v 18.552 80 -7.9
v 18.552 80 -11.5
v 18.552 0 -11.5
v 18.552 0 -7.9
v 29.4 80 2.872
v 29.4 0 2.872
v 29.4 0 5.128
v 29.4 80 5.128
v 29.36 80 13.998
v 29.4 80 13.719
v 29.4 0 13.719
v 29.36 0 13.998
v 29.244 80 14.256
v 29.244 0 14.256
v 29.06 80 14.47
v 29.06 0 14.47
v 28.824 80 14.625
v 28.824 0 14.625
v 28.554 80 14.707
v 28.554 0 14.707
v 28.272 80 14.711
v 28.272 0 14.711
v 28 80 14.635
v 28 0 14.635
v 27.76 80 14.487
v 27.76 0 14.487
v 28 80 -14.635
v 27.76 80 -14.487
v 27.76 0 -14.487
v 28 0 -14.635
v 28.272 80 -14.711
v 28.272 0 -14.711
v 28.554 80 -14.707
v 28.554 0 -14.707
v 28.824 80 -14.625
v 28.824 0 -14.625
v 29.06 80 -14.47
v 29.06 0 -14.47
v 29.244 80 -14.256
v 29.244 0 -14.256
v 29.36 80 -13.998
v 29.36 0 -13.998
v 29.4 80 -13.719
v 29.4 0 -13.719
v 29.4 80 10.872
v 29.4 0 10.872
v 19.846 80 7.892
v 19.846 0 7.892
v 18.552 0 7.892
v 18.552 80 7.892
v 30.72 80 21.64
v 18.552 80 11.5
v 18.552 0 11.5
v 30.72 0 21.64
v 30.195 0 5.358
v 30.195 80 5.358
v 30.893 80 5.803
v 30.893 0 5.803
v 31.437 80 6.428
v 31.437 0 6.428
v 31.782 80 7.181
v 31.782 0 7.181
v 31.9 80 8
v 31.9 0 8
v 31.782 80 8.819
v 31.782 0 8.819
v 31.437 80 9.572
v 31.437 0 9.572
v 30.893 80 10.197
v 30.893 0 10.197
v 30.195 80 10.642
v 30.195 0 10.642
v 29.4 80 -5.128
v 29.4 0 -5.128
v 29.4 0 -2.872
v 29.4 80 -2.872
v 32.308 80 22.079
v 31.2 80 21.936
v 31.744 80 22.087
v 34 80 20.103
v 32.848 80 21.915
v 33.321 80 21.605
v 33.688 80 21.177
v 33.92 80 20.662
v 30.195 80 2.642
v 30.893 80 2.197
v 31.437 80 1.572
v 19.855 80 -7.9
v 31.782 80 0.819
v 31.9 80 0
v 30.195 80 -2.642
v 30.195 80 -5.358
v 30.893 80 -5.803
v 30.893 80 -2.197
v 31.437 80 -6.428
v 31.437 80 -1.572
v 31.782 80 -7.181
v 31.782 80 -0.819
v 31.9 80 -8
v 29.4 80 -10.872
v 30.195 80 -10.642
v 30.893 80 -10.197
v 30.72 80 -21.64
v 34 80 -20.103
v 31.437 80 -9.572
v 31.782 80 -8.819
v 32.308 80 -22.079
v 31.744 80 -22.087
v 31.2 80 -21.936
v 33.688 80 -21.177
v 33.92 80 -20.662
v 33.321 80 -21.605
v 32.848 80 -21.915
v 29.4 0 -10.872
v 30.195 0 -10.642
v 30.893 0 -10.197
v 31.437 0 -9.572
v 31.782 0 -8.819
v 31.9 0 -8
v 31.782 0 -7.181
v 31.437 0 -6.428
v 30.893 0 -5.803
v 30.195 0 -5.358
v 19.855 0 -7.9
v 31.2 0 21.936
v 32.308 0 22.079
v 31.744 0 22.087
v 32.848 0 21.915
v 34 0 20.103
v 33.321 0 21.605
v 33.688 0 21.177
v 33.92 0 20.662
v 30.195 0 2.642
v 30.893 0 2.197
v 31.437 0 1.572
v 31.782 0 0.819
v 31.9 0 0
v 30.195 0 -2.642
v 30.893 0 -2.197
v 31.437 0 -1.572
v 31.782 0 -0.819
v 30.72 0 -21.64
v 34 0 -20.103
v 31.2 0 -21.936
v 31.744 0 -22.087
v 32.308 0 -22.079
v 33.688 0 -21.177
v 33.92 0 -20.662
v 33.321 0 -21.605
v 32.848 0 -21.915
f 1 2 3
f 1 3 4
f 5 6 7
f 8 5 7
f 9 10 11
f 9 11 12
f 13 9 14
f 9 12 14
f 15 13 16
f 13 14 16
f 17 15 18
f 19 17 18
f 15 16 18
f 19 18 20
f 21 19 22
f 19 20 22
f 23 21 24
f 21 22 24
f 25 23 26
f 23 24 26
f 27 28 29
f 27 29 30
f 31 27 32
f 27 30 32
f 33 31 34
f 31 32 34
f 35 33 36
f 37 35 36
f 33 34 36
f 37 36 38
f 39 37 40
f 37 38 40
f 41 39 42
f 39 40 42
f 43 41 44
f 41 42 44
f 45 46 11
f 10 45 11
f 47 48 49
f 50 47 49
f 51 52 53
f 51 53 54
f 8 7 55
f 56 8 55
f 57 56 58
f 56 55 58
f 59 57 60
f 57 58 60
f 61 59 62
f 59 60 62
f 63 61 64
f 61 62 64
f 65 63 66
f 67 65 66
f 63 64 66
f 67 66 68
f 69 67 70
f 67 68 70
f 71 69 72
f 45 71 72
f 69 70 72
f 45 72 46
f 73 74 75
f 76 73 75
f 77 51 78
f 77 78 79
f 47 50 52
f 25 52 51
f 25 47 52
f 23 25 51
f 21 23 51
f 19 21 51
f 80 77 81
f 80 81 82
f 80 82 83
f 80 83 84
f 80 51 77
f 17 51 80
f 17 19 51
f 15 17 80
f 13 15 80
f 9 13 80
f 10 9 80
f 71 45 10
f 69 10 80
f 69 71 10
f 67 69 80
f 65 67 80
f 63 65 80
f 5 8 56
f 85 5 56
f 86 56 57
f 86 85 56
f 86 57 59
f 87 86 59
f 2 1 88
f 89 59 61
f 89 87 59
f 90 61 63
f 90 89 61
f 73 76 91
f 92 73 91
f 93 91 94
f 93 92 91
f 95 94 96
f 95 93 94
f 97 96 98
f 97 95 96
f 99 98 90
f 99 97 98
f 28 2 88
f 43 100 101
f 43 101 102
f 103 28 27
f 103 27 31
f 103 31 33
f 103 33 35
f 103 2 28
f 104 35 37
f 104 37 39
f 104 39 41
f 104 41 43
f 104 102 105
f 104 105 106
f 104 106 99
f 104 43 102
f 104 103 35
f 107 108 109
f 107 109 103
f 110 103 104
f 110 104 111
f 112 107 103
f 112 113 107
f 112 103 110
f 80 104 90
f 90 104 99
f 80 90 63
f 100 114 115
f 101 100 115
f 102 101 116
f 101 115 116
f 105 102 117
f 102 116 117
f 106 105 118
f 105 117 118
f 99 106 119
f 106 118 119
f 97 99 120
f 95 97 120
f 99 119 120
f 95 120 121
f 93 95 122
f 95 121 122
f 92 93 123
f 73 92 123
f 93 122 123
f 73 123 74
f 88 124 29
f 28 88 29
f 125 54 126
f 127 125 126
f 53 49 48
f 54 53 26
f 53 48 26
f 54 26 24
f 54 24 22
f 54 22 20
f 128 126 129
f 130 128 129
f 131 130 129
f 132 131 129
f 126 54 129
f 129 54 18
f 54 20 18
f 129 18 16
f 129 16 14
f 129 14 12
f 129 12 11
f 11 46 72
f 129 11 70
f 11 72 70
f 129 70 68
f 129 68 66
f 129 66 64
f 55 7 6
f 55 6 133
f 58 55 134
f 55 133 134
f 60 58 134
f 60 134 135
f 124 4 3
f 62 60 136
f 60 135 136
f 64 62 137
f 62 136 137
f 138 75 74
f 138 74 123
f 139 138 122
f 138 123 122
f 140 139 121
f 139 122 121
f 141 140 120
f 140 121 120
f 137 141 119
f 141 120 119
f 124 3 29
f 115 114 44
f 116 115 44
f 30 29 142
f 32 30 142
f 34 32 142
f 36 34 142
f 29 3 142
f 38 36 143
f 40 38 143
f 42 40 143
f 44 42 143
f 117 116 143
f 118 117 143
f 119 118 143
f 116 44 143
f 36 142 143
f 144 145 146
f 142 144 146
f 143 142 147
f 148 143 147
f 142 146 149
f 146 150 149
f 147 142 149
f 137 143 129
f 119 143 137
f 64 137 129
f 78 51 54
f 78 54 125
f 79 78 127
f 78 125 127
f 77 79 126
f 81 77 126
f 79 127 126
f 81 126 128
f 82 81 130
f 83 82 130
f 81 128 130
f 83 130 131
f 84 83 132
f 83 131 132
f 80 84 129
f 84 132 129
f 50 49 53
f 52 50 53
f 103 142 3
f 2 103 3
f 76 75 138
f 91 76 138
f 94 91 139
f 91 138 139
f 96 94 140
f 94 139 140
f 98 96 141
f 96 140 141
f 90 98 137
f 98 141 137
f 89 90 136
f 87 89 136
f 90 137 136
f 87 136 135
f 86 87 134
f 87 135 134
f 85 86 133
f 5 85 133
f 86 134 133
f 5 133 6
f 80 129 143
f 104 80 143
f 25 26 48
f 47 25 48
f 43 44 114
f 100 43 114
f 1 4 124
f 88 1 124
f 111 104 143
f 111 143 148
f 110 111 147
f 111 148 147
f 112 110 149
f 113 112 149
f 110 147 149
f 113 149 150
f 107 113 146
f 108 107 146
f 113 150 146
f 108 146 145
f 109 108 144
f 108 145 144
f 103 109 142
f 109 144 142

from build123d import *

# Parameters (mm, degrees)
BOSS_EXTRUDE1_DEPTH = 80


with BuildPart() as part:
    # Sketch1 → Boss-Extrude1 (new body)
    with BuildSketch(Plane(origin=(0, 0, 0), x_dir=(1, 0, 0), z_dir=(0, 1, 0))):
        with BuildLine():
            Line((18.551800259, 11.5), (18.551800259, 7.9))
            Line((18.551800259, 7.9), (19.855180026, 7.9))
            Line((19.855180026, 7.9), (27.7598156, 14.487196312))
            ThreePointArc((27.7598156, 14.487196312), (28.824155396, 14.624564454), (29.4, 13.718975032))
            Line((29.4, 13.718975032), (29.4, 10.872281323))
            ThreePointArc((29.4, 10.872281323), (31.9, 8), (29.4, 5.127718677))
            Line((29.4, 5.127718677), (29.4, 2.872281323))
            ThreePointArc((29.4, 2.872281323), (31.9, 0), (29.4, -2.872281323))
            Line((29.4, -2.872281323), (29.4, -5.127718677))
            ThreePointArc((29.4, -5.127718677), (31.9, -8), (29.4, -10.872281323))
            Line((29.4, -10.872281323), (29.4, -13.718975032))
            ThreePointArc((29.4, -13.718975032), (28.824155396, -14.624564454), (27.7598156, -14.487196312))
            Line((27.7598156, -14.487196312), (19.845818206, -7.892198484))
            Line((19.845818206, -7.892198484), (18.551800259, -7.892198484))
            Line((18.551800259, -7.892198484), (18.551800259, -11.5))
            Line((18.551800259, -11.5), (30.719631201, -21.639859118))
            ThreePointArc((30.719631201, -21.639859118), (32.848310792, -21.914595401), (34, -20.103416559))
            Line((34, -20.103416559), (34, 20.103416559))
            ThreePointArc((34, 20.103416559), (32.848310792, 21.914595401), (30.719631201, 21.639859118))
            Line((30.719631201, 21.639859118), (18.551800259, 11.5))
        make_face()
    extrude(amount=BOSS_EXTRUDE1_DEPTH)


solid = part.part
